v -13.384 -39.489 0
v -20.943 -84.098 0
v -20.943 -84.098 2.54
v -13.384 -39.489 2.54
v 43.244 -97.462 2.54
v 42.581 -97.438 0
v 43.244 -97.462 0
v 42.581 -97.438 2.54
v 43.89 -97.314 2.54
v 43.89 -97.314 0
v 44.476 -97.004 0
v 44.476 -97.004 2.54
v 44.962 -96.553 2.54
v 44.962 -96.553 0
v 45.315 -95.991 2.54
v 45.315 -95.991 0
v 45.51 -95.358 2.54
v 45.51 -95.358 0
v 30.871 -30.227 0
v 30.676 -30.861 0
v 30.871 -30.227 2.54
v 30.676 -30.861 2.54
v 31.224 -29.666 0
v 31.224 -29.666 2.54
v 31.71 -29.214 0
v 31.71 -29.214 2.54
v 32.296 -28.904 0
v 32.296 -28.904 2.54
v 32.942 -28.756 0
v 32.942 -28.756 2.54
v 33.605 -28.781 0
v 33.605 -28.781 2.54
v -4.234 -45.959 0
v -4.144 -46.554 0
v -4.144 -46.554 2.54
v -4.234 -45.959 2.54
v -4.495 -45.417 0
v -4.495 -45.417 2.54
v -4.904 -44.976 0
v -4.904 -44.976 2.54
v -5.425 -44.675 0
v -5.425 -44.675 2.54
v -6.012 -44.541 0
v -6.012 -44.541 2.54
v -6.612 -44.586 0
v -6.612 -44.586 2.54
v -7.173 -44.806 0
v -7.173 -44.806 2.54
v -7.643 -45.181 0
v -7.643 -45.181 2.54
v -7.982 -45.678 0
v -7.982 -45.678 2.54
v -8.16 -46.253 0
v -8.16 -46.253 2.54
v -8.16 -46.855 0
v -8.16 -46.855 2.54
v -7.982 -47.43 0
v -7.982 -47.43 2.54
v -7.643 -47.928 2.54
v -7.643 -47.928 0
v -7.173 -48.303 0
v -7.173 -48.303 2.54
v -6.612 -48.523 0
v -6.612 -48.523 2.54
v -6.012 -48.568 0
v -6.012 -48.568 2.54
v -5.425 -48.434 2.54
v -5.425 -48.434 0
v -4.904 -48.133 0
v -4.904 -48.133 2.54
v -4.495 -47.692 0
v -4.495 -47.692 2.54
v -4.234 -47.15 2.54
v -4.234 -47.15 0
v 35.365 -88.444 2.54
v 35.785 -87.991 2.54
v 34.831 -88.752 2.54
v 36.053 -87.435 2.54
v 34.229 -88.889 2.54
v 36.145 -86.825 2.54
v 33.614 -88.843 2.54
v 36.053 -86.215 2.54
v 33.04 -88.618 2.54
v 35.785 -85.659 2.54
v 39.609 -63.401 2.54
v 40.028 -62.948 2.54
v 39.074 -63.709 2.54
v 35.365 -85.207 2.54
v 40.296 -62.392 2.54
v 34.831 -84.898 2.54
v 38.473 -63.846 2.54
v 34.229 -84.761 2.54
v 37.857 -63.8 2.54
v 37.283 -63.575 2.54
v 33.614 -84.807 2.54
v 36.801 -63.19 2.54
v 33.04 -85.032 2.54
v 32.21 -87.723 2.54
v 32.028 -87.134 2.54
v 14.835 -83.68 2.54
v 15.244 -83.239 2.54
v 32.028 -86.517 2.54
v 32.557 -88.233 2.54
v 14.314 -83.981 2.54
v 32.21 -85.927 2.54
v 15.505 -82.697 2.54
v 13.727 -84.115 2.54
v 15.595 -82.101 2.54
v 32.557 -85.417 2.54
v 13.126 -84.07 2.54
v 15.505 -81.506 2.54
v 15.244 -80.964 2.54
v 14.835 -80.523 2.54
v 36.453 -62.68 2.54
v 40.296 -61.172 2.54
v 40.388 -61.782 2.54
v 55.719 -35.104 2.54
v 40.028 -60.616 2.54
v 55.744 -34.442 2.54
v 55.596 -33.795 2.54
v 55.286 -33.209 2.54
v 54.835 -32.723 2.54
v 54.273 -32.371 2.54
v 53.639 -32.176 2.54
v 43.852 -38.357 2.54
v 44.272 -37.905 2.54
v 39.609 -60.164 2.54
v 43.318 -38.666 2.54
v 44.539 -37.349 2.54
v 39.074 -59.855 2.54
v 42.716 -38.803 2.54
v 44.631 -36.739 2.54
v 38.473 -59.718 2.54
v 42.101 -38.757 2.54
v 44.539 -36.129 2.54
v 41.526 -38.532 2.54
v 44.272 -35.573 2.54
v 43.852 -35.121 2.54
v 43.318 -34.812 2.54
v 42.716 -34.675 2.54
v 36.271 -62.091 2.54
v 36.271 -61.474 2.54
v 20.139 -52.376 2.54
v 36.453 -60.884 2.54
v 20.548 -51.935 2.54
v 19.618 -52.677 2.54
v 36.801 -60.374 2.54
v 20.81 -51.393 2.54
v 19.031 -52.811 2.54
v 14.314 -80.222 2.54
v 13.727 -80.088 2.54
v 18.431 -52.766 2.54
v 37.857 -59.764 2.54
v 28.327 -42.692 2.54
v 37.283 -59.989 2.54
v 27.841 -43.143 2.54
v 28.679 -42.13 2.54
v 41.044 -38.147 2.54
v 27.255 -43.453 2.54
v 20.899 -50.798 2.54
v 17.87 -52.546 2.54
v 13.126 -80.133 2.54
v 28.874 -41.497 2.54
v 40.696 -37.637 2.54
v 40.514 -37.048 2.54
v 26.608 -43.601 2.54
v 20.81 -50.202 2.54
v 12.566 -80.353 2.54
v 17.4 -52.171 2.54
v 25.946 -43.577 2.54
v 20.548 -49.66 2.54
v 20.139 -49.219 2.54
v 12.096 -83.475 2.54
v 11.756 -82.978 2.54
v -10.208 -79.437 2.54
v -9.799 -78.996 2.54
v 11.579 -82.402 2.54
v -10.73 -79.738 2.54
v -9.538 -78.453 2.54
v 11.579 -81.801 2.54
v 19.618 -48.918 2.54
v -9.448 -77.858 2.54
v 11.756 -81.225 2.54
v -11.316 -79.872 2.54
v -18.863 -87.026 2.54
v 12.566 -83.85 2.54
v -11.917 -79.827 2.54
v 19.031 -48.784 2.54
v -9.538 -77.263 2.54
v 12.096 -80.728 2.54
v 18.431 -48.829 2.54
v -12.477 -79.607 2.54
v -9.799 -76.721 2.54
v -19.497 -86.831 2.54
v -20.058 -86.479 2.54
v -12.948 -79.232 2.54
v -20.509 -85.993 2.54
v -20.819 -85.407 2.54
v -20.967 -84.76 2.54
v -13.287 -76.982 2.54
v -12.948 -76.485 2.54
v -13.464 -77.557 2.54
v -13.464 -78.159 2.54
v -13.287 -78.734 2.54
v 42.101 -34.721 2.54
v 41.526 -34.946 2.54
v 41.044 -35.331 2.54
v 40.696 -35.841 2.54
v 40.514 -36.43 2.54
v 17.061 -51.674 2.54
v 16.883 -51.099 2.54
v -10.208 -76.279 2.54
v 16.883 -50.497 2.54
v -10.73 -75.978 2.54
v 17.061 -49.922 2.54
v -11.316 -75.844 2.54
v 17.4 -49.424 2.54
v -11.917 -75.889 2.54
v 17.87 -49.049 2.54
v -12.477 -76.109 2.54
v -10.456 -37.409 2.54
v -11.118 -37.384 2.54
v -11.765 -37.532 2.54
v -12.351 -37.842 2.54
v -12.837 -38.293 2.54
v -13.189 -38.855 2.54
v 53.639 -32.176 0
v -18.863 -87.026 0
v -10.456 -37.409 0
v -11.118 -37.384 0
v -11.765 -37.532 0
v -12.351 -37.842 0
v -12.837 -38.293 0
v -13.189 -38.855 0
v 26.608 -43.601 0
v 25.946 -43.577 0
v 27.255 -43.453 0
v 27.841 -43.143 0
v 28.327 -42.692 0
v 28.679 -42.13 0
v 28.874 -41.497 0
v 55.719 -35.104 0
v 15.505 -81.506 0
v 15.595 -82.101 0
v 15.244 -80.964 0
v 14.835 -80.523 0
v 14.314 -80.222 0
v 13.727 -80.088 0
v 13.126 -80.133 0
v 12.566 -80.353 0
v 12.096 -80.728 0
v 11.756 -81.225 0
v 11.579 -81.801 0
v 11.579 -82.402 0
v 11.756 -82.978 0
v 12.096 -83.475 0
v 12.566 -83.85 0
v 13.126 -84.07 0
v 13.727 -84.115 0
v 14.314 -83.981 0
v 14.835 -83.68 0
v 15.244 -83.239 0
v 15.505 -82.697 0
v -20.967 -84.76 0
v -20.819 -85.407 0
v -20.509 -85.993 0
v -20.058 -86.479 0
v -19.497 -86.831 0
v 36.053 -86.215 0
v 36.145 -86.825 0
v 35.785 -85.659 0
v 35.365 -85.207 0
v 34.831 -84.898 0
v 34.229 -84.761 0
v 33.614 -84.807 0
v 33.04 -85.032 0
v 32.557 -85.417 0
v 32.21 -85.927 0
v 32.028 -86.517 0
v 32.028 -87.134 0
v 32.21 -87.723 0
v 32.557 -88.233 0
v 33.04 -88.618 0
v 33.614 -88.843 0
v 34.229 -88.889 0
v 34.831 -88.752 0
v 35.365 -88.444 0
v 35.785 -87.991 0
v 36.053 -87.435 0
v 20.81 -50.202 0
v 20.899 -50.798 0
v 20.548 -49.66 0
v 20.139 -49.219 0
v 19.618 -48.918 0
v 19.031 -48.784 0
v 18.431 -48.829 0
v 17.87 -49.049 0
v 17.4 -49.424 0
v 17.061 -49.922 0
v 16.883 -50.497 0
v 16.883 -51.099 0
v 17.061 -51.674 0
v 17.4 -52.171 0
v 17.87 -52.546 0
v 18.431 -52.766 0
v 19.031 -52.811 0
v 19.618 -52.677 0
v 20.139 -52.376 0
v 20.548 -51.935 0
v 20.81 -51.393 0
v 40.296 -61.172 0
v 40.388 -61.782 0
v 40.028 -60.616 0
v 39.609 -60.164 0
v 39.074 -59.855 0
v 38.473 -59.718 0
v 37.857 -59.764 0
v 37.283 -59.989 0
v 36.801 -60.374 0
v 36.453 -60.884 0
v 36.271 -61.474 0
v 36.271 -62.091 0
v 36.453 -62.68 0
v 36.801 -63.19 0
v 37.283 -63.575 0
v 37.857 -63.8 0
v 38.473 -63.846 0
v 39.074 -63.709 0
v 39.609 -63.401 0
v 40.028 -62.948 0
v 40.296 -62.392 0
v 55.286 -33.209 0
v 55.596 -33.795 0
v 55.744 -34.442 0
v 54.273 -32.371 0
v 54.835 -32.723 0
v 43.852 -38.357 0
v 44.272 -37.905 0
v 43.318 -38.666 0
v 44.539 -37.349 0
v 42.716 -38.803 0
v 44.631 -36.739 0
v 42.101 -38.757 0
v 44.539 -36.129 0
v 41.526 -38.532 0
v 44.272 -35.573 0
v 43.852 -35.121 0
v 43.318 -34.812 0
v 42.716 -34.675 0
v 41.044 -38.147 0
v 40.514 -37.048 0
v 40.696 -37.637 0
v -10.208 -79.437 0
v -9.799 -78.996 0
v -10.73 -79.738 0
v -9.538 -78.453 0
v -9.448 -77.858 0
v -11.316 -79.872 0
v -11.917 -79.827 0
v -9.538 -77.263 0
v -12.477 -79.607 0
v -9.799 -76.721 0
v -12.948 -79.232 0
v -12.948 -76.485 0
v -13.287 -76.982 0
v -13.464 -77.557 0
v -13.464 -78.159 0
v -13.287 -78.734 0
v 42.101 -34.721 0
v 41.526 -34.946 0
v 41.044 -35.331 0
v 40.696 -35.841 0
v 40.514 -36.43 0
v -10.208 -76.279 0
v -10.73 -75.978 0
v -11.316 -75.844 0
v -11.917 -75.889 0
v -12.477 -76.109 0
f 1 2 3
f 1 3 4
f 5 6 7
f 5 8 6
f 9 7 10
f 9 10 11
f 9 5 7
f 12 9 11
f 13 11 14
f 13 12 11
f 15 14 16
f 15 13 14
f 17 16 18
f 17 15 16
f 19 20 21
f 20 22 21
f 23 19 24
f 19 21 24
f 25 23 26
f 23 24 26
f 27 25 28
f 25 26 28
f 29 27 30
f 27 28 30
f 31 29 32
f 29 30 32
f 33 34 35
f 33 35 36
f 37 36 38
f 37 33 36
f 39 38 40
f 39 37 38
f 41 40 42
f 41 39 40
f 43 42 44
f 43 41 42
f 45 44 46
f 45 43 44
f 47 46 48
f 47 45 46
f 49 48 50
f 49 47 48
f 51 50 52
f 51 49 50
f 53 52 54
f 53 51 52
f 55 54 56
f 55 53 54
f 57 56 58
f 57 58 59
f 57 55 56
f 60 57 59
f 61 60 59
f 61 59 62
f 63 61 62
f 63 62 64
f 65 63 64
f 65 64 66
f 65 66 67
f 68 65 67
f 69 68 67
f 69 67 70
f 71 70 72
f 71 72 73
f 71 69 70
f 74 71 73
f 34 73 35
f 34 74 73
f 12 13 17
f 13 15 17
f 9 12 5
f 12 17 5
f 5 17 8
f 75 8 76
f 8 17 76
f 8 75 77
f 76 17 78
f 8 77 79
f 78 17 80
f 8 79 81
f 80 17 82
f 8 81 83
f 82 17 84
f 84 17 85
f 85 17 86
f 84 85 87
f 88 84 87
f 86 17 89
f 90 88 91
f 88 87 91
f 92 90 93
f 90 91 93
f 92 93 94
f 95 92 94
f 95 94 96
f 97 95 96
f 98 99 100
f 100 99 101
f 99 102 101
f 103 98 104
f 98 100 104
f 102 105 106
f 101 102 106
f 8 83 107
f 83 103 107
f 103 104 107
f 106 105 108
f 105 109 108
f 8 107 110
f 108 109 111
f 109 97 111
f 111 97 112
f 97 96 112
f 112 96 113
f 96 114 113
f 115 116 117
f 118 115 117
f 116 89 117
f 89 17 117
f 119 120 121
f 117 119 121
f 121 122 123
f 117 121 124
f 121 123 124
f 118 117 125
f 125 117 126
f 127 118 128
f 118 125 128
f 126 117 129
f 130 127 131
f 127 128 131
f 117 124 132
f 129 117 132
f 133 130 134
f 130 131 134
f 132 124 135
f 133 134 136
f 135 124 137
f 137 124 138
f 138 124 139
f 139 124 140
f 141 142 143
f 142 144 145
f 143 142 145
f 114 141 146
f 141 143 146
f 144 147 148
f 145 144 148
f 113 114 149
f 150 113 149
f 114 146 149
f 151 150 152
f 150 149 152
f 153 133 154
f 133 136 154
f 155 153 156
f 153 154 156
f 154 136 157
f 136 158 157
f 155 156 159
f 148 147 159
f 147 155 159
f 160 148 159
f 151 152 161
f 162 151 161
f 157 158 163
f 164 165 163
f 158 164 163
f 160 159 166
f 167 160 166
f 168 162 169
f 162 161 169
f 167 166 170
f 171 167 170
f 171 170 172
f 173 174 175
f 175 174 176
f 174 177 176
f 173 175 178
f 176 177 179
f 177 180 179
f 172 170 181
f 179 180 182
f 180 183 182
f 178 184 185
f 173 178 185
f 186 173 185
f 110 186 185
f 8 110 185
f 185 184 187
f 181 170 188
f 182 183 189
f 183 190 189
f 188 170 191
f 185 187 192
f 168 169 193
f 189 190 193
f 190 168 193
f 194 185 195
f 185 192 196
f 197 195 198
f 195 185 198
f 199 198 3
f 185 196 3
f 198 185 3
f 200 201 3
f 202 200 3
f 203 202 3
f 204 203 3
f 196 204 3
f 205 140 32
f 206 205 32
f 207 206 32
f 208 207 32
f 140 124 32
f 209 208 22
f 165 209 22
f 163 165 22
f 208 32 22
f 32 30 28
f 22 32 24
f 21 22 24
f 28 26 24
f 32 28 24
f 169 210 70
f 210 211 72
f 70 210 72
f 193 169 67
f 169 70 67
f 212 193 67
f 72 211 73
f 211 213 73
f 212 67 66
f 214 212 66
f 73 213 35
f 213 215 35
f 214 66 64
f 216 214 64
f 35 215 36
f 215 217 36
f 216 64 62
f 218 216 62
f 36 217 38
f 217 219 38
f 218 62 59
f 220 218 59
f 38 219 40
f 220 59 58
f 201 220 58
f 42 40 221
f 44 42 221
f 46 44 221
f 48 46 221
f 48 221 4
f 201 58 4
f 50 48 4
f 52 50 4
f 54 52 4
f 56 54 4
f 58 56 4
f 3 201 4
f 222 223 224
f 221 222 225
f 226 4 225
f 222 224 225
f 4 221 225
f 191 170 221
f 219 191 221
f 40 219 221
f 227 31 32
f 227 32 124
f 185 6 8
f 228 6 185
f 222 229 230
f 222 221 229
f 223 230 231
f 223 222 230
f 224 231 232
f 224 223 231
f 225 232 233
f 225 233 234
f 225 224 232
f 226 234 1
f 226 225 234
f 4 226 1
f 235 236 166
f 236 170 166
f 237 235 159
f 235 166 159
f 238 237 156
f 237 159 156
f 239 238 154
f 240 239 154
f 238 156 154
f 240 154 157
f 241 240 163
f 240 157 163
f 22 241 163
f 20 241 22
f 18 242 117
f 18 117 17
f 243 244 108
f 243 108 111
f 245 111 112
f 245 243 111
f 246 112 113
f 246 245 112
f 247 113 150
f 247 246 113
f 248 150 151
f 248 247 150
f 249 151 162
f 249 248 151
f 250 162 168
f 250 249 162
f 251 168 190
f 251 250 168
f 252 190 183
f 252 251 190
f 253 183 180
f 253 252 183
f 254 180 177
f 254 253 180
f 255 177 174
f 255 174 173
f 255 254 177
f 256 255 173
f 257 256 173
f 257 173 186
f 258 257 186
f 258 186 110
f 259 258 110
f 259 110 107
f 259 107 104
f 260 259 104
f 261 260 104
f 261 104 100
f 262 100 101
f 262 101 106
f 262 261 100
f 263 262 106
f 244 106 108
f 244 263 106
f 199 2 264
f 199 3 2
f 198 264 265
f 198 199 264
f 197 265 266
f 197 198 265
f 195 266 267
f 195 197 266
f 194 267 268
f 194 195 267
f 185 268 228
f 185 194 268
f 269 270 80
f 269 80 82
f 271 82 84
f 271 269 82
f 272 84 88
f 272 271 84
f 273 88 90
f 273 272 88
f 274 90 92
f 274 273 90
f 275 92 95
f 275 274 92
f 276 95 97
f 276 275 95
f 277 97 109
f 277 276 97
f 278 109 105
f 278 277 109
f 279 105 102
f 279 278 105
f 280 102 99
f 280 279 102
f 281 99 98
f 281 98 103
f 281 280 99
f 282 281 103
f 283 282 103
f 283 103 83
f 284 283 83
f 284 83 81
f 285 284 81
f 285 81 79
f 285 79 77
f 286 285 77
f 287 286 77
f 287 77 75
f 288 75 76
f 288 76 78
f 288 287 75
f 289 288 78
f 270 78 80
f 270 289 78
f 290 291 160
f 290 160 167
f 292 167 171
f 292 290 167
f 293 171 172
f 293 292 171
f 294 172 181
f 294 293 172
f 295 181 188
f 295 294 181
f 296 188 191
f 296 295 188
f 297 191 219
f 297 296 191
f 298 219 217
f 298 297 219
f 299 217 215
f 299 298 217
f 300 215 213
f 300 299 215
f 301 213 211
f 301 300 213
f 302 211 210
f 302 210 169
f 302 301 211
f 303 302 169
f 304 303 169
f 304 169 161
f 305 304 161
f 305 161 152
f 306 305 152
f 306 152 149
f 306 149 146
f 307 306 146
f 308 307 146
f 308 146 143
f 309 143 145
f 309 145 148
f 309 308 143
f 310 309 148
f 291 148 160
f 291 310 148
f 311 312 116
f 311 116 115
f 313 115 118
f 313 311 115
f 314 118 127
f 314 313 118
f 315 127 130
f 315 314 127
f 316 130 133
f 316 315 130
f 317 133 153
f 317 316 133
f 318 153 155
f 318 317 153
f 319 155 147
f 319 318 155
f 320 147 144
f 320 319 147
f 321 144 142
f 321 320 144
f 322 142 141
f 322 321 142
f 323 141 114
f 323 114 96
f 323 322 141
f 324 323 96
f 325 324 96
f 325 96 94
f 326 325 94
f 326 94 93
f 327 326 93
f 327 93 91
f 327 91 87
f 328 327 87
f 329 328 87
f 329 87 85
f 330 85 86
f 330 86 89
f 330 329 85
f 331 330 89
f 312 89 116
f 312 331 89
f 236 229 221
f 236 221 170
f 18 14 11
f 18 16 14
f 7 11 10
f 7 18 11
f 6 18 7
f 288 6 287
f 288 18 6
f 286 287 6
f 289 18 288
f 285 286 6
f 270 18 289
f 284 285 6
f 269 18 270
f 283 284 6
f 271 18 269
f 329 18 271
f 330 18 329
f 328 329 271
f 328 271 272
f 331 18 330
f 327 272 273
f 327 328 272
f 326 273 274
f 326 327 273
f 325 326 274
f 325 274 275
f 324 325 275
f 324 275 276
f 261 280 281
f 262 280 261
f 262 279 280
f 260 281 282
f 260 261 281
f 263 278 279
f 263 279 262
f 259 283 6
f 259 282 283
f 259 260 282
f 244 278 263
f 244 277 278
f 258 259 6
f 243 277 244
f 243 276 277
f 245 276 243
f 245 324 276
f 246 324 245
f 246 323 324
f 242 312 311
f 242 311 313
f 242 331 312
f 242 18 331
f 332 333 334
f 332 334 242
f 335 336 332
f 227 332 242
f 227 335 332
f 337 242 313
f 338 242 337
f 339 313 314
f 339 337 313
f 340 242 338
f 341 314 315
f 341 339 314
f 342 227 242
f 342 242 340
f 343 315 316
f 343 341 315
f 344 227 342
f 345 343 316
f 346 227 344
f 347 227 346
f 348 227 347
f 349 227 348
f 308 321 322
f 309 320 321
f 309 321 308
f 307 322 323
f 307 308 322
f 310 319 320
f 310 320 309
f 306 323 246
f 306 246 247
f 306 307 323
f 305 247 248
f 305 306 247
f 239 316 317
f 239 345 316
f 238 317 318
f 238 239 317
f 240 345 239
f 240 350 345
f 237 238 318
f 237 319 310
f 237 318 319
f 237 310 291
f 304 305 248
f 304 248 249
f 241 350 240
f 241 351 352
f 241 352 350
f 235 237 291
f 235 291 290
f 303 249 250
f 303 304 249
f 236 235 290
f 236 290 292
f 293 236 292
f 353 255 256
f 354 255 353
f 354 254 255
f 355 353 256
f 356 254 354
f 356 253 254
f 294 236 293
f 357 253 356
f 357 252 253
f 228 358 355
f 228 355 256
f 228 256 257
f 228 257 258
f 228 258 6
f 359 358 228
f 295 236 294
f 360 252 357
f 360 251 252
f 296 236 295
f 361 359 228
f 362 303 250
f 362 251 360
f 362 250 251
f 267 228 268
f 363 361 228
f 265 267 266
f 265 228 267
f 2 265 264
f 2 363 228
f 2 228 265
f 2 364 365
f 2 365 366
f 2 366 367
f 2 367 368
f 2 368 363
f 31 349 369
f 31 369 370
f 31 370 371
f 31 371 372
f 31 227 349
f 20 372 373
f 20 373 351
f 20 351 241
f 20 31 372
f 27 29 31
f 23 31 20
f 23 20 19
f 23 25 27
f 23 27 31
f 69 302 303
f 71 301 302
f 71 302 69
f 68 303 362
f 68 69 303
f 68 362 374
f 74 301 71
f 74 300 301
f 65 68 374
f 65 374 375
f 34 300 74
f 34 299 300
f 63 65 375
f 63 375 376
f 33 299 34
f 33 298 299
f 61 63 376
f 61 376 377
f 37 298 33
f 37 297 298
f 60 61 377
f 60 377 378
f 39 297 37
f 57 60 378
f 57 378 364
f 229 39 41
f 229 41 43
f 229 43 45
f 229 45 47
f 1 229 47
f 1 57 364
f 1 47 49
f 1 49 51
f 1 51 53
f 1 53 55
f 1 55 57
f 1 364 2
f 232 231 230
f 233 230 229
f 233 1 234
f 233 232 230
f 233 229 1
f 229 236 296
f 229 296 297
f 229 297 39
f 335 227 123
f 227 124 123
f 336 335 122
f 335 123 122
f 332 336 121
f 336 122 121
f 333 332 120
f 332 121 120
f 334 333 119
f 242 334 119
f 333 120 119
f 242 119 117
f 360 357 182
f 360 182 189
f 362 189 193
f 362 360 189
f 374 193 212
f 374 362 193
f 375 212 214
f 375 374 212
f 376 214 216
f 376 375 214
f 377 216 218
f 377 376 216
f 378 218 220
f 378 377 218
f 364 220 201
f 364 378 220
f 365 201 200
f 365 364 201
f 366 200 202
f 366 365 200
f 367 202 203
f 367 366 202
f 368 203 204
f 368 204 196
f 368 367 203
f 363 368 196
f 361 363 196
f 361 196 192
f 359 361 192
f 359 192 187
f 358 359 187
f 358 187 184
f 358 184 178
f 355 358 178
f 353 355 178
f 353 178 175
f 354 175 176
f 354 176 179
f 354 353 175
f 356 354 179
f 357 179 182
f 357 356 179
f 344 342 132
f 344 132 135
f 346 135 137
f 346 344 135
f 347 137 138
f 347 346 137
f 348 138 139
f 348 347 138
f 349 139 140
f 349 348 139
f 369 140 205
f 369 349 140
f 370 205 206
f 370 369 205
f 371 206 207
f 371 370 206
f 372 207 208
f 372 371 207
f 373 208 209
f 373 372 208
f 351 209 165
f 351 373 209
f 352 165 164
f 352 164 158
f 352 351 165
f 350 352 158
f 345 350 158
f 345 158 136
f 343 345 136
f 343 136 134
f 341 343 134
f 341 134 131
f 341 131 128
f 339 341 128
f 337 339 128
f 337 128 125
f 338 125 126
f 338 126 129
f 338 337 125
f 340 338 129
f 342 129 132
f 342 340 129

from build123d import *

# Parameters (mm, degrees)
SKETCH1_R           = 2.019299997
SKETCH1_R_2         = 2.019299996
SKETCH1_R_3         = 2.070099997
BOSS_EXTRUDE1_DEPTH = 2.54
FILLET2_R           = 2.54


with BuildPart() as part:
    # Sketch1 → Boss-Extrude1 (new body)
    with BuildSketch(Plane.XY):
        Polygon((-12.959899663, -36.98438298), (28.449865782, -44.000886797), (31.100646676, -28.356597569), (56.143695302, -32.599911782), (45.085639298, -97.861973534), (-21.367174772, -86.602155504), align=None)
        with Locations((-6.163136056, -46.554336191)):
            Circle(SKETCH1_R, mode=Mode.SUBTRACT)
        with Locations((-11.467278822, -77.858146974)):
            Circle(SKETCH1_R_2, mode=Mode.SUBTRACT)
        with Locations((18.87991257, -50.797650404)):
            Circle(SKETCH1_R_2, mode=Mode.SUBTRACT)
        with Locations((13.575769804, -82.101461187)):
            Circle(SKETCH1_R_2, mode=Mode.SUBTRACT)
        with Locations((38.318029948, -61.782055276)):
            Circle(SKETCH1_R_3, mode=Mode.SUBTRACT)
        with Locations((34.074715735, -86.825103902)):
            Circle(SKETCH1_R_3, mode=Mode.SUBTRACT)
        with Locations((42.561344161, -36.73900665)):
            Circle(SKETCH1_R_3, mode=Mode.SUBTRACT)
    extrude(amount=BOSS_EXTRUDE1_DEPTH)

    # Fillet2
    fillet2_edges = [part.edges().sort_by_distance(p)[0] for p in [
        (-21.367174772, -86.602155504, 1.27),
        (-12.959899663, -36.98438298, 1.27),
        (28.449865782, -44.000886797, 1.27),
        (31.100646676, -28.356597569, 1.27),
        (56.143695302, -32.599911782, 1.27),
        (45.085639298, -97.861973534, 1.27),
    ]]
    fillet(fillet2_edges, radius=FILLET2_R)


solid = part.part
